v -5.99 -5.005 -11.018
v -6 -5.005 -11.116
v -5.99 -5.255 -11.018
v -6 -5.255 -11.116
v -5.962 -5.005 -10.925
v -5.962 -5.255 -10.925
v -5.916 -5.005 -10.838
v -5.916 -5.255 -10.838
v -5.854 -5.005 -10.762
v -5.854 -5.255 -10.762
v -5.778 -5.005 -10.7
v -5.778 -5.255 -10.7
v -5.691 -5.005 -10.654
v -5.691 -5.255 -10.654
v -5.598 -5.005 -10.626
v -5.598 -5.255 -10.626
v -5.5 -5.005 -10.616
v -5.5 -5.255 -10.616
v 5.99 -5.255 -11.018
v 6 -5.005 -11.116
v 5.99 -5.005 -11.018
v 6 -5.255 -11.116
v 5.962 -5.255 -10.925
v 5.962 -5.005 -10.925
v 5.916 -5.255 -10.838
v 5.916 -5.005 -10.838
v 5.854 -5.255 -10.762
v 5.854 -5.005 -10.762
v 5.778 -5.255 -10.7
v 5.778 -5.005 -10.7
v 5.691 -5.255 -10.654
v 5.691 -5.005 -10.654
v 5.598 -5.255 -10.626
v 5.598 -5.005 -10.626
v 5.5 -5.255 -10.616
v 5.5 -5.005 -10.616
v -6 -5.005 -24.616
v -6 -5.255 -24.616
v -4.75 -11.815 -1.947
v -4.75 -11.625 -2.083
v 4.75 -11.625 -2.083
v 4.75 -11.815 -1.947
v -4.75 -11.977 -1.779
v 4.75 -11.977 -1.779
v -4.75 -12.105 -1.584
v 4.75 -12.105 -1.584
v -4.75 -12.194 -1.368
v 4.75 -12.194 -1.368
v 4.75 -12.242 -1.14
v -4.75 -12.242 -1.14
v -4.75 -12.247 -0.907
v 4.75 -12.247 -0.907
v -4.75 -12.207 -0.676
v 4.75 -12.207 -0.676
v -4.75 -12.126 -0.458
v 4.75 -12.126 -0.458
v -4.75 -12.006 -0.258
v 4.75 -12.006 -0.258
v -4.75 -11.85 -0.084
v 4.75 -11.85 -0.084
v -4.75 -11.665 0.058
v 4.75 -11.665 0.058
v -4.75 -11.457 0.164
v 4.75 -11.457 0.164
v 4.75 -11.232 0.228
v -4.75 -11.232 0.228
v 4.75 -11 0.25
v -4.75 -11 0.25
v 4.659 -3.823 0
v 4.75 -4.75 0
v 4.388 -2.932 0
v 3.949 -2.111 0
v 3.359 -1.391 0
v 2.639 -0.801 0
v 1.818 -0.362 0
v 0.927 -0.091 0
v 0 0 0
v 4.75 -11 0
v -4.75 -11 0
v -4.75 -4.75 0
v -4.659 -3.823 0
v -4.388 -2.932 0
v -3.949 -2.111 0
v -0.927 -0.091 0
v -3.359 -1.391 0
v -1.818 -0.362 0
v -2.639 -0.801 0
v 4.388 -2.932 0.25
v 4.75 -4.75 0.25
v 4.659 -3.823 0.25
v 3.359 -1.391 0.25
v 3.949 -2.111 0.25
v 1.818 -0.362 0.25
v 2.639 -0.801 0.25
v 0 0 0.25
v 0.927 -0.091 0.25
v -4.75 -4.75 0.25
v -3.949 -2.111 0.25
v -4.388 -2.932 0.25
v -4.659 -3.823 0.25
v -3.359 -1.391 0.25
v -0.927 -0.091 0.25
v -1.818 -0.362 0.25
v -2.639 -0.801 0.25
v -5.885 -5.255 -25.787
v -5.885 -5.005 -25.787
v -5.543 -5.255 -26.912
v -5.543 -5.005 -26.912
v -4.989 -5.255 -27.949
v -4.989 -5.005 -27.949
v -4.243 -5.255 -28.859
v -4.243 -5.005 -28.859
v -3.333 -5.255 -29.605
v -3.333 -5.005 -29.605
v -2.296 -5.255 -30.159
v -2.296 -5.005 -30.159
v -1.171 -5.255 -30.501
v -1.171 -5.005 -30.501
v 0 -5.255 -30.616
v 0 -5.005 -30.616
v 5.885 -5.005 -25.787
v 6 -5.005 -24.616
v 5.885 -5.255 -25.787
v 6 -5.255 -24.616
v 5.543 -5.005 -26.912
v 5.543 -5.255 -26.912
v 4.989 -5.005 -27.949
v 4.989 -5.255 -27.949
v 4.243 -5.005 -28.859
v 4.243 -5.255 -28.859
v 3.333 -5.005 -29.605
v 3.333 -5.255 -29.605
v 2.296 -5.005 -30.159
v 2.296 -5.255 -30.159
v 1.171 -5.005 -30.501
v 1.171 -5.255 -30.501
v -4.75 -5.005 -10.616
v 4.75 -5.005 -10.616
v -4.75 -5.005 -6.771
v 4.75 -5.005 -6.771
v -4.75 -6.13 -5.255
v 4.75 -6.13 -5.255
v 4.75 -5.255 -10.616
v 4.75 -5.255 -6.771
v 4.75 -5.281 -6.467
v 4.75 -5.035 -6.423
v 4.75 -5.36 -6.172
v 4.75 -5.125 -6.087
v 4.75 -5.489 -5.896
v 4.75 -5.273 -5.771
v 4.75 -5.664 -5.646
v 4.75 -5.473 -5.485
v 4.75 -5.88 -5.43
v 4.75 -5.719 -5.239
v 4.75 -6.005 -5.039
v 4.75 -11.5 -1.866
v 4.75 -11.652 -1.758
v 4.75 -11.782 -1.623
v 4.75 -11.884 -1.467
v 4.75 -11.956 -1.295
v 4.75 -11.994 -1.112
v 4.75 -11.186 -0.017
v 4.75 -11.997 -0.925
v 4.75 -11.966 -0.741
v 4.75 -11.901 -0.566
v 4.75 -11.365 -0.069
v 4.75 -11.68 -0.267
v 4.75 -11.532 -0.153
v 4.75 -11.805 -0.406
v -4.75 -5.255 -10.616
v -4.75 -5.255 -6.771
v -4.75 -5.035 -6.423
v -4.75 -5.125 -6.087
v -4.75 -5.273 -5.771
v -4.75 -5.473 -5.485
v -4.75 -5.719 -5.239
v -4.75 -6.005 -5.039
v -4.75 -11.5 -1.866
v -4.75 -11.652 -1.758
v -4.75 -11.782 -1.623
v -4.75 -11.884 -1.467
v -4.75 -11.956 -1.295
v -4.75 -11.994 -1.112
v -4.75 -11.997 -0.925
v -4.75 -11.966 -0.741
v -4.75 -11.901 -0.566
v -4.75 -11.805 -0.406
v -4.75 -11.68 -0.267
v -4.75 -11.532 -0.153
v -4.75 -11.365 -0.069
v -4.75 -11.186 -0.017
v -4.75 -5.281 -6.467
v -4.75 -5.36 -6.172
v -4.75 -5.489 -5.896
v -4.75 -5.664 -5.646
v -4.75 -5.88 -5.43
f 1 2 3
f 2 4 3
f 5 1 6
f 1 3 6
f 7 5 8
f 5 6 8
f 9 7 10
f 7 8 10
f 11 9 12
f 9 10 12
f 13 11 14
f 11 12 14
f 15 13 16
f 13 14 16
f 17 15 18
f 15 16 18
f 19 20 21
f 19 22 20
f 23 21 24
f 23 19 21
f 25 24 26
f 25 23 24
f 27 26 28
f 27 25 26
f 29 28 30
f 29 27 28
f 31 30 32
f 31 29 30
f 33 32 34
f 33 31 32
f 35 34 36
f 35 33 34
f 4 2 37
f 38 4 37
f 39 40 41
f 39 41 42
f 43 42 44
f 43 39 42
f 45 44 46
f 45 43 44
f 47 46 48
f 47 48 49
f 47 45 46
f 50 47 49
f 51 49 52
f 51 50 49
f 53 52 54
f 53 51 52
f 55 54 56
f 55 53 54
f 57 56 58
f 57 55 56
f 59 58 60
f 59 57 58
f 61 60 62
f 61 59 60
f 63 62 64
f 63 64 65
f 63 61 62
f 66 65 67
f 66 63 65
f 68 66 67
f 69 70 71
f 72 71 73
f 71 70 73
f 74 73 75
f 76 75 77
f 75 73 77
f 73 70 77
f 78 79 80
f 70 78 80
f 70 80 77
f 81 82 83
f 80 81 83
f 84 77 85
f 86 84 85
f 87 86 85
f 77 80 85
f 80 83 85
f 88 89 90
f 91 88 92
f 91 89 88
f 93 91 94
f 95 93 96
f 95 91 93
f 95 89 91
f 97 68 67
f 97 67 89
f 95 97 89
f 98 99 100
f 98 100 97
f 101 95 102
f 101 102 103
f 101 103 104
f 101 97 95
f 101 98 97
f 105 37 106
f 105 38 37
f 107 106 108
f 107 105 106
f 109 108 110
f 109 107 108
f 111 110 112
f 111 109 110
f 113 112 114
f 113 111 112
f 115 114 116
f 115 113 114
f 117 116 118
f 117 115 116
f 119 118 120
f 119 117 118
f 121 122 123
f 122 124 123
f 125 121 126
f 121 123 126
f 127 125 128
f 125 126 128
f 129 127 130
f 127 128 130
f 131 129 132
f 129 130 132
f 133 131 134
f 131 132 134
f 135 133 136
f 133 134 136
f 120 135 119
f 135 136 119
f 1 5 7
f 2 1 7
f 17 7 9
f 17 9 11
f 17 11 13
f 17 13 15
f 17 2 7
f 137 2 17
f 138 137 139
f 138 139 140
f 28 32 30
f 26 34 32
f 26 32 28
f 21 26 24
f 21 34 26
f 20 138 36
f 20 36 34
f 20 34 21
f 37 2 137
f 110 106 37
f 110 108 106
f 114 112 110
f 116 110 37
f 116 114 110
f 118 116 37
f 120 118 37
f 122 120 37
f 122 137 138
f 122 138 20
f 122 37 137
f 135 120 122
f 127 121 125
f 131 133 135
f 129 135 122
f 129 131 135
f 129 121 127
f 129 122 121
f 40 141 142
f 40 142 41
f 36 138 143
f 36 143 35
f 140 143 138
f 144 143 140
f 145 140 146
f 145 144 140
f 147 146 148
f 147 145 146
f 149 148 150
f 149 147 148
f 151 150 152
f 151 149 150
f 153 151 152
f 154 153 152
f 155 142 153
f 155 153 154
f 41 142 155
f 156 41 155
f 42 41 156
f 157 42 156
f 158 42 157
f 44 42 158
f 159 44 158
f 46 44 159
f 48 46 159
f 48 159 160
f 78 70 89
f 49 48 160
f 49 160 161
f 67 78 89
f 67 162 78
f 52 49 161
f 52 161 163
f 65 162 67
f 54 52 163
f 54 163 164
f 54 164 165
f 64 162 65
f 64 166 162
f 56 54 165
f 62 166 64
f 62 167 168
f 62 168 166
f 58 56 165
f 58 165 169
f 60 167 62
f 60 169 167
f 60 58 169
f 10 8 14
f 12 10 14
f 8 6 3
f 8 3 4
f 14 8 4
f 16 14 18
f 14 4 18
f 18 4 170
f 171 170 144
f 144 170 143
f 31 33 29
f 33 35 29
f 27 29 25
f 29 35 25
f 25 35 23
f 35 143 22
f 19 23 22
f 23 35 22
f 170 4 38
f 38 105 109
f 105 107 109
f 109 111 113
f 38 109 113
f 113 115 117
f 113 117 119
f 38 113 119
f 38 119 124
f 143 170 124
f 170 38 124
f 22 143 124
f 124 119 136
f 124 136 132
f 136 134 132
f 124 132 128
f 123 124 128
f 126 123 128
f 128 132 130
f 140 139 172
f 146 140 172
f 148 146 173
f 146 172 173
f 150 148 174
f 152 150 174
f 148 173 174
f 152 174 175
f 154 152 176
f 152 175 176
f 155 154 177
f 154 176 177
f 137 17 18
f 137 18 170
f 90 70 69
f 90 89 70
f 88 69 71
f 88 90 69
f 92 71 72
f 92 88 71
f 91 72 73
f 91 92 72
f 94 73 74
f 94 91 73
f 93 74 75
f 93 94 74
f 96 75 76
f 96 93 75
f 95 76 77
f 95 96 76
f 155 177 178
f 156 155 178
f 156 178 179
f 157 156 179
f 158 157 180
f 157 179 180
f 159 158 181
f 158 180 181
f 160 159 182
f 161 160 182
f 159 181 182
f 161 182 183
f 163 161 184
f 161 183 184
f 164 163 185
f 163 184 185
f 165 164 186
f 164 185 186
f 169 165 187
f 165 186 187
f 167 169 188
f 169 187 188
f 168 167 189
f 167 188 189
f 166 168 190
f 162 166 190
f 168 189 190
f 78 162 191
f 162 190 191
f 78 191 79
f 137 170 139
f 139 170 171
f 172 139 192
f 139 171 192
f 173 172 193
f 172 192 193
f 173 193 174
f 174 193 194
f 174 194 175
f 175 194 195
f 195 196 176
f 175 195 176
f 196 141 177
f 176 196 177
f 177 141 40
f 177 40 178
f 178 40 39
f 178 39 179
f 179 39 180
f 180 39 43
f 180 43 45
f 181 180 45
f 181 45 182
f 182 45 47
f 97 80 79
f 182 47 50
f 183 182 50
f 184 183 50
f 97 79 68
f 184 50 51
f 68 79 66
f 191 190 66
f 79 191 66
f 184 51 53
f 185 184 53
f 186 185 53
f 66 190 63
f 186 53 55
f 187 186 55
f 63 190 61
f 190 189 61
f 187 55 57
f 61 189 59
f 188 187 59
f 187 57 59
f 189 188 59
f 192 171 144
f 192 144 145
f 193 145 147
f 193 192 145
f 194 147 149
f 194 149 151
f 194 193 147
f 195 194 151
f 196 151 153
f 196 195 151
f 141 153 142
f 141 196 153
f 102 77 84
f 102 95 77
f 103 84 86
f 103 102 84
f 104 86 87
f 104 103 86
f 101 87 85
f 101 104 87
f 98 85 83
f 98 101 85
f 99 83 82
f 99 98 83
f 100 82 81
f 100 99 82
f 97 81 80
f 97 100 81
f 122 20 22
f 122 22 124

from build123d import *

# Parameters (mm, degrees)
SURFACE_EXTRUDE1_1_BACK  = 4.75
SURFACE_EXTRUDE1_1_DEPTH = 9.5
THICKEN1_T1              = 0.25
FILLET1_R                = 4.75
SKETCH2_W                = 12
SKETCH2_H                = 20
BOSS_EXTRUDE1_DEPTH      = 0.25
FILLET2_R                = 6
FILLET3_R                = 0.5


with BuildPart() as body_1:
    # Surface-Extrude1: a surface, the sketch's curves swept straight by 9.5 mm
    with BuildLine(Plane(origin=(0, 0, 0), x_dir=(0, 0, -1), z_dir=(1, 0, 0)).offset(-SURFACE_EXTRUDE1_1_BACK), mode=Mode.PRIVATE) as surface_extrude1_1_path:
        Line((30.616025404, -5.004809472), (10.616025404, -5.004809472))
        Line((10.616025404, -5.004809472), (6.770725942, -5.004809472))
        ThreePointArc((6.770725942, -5.004809472), (5.770725942, -5.272758664), (5.038675135, -6.004809472))
        Line((5.038675135, -6.004809472), (1.866025404, -11.5))
        ThreePointArc((1.866025404, -11.5), (0.741180955, -11.965925826), (0, -11))
        Line((0, -11), (0, 0))
    surface_extrude1_1 = Shell.extrude(surface_extrude1_1_path.wire(), (1 * SURFACE_EXTRUDE1_1_DEPTH, 0 * SURFACE_EXTRUDE1_1_DEPTH, 0 * SURFACE_EXTRUDE1_1_DEPTH))
    add(Solid.thicken(surface_extrude1_1, THICKEN1_T1))

    # Fillet1
    fillet1_edges = [body_1.edges().sort_by_distance(p)[0] for p in [
        (4.75, 0, 0.125),
        (-4.75, 0, 0.125),
    ]]
    fillet(fillet1_edges, radius=FILLET1_R - 0.0001)  # a hair under: the kernel refuses the full size

    # Sketch2 → Boss-Extrude1 (add)
    with BuildSketch(Plane(origin=(0, -5.004809472, 0), x_dir=(1, 0, 0), z_dir=(0, 1, 0))):
        with Locations((0, 20.616025404)):
            Rectangle(SKETCH2_W, SKETCH2_H)
    extrude(amount=-BOSS_EXTRUDE1_DEPTH)

    # Fillet2
    fillet2_edges = [body_1.edges().sort_by_distance(p)[0] for p in [
        (-6, -5.129809472, -30.616025404),
        (6, -5.129809472, -30.616025404),
    ]]
    fillet(fillet2_edges, radius=FILLET2_R - 0.0001)  # a hair under: the kernel refuses the full size

    # Fillet3
    fillet3_edges = [body_1.edges().sort_by_distance(p)[0] for p in [
        (-6, -5.129809472, -10.616025404),
        (6, -5.129809472, -10.616025404),
    ]]
    fillet(fillet3_edges, radius=FILLET3_R)


solid = body_1.part
